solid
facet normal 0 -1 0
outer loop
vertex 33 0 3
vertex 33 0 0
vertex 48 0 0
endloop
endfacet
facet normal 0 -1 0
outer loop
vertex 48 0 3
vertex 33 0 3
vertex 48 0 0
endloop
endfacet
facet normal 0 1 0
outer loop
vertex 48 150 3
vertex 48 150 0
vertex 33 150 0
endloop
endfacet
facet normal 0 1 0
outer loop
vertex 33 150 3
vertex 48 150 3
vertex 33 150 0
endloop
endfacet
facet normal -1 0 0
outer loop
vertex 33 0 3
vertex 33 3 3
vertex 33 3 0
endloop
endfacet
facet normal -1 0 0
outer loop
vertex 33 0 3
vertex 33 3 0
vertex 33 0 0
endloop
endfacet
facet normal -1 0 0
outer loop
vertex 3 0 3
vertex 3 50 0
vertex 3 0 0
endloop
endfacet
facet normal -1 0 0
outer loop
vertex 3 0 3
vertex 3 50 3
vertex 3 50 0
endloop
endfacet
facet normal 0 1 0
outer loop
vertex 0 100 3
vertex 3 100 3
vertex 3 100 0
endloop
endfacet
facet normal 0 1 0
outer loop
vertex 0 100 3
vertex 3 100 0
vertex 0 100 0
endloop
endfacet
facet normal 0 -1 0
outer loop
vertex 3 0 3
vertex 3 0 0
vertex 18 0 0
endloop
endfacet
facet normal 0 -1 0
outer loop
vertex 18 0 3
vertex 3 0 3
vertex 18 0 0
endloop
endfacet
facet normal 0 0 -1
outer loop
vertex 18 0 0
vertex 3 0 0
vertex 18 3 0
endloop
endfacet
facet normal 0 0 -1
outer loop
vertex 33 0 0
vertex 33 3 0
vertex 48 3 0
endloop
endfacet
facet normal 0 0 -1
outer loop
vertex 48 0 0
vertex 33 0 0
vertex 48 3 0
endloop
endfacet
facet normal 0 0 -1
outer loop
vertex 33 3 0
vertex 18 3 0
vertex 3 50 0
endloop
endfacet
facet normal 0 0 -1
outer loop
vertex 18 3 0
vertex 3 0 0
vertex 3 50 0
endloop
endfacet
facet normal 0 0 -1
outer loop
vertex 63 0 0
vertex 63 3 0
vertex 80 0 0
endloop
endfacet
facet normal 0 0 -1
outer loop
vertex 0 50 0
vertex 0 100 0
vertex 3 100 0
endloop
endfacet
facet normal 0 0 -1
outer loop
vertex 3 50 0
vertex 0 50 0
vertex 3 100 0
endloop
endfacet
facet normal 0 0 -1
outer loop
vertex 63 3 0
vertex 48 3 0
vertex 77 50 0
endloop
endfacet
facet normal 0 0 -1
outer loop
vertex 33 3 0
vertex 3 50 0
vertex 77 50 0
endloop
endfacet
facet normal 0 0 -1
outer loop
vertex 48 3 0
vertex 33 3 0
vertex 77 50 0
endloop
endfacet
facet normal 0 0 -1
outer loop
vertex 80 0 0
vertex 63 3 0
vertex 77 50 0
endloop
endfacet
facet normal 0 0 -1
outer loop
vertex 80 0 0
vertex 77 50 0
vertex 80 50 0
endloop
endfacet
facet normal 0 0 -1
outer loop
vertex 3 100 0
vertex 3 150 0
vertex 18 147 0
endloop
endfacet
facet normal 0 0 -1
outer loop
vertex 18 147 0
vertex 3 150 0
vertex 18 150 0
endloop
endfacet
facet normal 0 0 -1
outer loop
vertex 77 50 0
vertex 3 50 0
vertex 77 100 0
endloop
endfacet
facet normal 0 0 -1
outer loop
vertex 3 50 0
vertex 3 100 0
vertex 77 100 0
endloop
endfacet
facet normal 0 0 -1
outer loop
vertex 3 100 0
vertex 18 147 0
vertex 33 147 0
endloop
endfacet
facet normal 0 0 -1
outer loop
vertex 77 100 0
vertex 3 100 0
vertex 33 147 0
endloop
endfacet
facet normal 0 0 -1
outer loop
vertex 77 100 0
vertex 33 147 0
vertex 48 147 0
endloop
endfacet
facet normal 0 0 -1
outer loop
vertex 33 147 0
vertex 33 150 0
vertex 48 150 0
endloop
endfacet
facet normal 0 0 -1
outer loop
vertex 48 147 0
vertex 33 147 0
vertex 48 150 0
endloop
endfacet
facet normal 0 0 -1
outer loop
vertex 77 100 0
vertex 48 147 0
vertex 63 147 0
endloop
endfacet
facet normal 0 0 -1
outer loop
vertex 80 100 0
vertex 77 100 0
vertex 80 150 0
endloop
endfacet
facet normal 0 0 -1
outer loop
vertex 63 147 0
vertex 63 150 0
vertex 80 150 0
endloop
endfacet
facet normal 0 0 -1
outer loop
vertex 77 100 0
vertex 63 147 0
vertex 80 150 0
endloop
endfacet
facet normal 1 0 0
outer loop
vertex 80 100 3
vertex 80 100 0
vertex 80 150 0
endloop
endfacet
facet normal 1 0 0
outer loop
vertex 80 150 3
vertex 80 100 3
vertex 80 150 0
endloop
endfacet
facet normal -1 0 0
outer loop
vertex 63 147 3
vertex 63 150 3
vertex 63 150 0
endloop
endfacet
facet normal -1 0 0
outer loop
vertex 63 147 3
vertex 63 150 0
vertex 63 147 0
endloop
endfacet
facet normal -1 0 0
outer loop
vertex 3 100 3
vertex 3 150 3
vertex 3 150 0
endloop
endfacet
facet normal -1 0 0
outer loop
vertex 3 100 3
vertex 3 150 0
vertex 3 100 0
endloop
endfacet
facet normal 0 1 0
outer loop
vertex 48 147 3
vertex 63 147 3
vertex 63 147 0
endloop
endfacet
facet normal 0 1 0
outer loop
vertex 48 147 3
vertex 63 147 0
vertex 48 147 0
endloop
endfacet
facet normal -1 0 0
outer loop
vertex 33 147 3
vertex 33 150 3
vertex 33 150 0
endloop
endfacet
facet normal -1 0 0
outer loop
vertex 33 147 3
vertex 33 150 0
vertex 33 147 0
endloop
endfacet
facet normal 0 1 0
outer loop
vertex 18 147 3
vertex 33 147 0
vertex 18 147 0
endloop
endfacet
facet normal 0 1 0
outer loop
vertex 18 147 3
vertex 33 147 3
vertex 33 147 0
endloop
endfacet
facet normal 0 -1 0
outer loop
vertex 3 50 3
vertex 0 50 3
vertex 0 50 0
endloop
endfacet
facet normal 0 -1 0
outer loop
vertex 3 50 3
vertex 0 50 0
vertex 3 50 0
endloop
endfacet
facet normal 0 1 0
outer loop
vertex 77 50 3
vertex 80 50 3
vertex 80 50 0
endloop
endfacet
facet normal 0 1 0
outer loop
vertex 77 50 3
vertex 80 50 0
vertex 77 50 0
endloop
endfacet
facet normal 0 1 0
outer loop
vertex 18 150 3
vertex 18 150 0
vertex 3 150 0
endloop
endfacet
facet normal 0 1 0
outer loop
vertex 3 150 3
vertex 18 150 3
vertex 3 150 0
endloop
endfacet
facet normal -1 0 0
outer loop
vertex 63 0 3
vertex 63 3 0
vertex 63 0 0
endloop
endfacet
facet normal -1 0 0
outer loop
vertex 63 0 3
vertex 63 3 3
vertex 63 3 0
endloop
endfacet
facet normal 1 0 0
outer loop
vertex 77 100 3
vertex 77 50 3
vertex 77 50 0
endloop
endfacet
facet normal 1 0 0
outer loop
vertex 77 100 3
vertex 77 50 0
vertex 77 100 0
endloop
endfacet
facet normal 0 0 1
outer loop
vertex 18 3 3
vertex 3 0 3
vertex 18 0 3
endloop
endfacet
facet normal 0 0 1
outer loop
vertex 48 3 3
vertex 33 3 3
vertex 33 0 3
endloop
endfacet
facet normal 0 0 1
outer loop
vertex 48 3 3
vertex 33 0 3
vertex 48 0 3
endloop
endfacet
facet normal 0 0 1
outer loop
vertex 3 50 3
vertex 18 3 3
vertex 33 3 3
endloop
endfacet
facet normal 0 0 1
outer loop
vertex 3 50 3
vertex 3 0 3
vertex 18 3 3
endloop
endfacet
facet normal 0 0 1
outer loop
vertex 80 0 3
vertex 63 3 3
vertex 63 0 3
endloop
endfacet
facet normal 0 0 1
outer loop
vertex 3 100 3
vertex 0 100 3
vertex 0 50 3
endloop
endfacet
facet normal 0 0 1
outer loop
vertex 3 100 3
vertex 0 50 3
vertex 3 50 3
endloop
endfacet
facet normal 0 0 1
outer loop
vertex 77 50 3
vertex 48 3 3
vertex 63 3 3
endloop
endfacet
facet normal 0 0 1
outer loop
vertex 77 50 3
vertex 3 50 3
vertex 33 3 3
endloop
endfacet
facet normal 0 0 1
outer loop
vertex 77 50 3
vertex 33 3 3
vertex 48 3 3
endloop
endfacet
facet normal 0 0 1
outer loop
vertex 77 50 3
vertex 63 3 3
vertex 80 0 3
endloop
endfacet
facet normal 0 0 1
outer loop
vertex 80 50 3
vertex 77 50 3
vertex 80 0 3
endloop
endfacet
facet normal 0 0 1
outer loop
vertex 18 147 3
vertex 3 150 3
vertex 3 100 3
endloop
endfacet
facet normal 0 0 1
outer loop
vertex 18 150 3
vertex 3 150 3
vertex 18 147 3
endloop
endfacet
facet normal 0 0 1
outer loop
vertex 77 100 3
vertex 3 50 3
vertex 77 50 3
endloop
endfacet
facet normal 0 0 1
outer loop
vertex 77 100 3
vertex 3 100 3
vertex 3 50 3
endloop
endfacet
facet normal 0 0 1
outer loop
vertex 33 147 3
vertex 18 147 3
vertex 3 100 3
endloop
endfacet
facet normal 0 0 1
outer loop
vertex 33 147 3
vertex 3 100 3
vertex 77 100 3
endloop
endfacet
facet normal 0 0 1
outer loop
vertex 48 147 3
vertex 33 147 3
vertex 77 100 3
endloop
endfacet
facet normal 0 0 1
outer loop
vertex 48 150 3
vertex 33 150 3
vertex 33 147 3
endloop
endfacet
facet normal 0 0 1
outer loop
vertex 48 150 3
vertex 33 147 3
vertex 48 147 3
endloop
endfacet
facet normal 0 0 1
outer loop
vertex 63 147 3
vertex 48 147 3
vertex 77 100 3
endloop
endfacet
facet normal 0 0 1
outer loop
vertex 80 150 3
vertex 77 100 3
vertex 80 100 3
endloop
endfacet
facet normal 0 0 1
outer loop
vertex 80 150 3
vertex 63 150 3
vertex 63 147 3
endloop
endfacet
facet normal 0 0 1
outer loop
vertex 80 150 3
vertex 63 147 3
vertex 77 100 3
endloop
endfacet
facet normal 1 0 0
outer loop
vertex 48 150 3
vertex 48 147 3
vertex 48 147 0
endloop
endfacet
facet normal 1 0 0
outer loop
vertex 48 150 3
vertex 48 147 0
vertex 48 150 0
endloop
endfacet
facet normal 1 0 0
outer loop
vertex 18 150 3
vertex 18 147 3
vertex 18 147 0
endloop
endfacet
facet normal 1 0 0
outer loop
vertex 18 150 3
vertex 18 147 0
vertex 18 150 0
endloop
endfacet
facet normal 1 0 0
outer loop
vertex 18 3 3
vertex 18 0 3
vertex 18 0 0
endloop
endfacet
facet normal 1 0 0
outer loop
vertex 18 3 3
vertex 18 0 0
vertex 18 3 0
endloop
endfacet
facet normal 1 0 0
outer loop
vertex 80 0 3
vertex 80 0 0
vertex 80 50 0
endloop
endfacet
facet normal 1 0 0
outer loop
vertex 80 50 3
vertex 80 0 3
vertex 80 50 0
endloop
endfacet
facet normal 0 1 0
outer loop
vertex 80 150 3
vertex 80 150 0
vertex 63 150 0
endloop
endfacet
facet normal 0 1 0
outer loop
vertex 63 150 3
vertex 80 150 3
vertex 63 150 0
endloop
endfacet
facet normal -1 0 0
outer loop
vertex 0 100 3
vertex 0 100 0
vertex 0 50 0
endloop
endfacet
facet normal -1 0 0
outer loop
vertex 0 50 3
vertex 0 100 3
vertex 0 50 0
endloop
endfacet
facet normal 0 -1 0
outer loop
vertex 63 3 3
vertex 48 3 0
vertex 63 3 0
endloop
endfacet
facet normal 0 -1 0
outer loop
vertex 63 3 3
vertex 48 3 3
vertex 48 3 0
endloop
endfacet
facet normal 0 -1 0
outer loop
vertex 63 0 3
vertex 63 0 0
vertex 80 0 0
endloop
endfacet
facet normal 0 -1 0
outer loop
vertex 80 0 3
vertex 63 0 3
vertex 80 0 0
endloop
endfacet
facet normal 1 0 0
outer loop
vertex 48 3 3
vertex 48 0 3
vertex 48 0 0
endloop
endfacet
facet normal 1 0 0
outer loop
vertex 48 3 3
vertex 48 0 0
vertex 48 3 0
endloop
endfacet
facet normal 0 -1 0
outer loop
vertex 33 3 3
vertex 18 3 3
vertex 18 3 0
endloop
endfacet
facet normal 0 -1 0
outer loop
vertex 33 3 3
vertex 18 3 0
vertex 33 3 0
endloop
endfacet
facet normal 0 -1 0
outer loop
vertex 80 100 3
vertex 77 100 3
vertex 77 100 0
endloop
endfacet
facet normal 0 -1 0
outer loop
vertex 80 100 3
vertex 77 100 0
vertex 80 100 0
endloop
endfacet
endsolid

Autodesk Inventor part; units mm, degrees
ref_plane "YZ Plane" through (0, 0, 0) normal (1, 0, 0) x (0, 1, 0)
ref_plane "XZ Plane" through (0, 0, 0) normal (0, 1, 0) x (-1, 0, 0)
ref_plane "XY Plane" through (0, 0, 0) normal (0, 0, 1) x (1, 0, 0)
sketch "Boceto1" plane through (0, 0, 0) normal (0, 0, 1) x (1, 0, 0)
  line L0 (0, 0) -> (80, 0)
  line L1 (80, 0) -> (80, 150)
  line L2 (80, 150) -> (0, 150)
  line L3 (0, 150) -> (0, 0)
  dimension "d0" = 80
  dimension "d1" = 150
extrude "Extrusión1" add sketch "Boceto1" along normal blind 3
sketch "Boceto2" plane through (0, 0, 3) normal (0, 0, 1) x (1, 0, 0)
  line L0 (0, 0) -> (80, 0) construction
  line L1 (80, 0) -> (80, 150) construction
  line L2 (80, 150) -> (0, 150) construction
  line L3 (0, 150) -> (0, 0) construction
  line L4 (3, 0) -> (0, 0)
  line L5 (0, 0) -> (0, 50)
  line L6 (0, 50) -> (3, 50)
  line L7 (3, 50) -> (3, 0)
  line L8 (0, 150) -> (3, 150)
  line L9 (3, 150) -> (3, 100)
  line L10 (3, 100) -> (0, 100)
  line L11 (0, 100) -> (0, 150)
  line L12 (77, 100) -> (80, 100)
  line L13 (80, 100) -> (80, 50)
  line L14 (80, 50) -> (77, 50)
  line L15 (77, 50) -> (77, 100)
  line L16 (80, 0) -> (80, 150) construction
  point P0 (80, 75)
  point P1 (80, 75)
  dimension "d4" = 3
  dimension "d5" = 50
  dimension "d6" = 3
  dimension "d7" = 50
  dimension "d8" = 50
  dimension "d9" = 3
extrude "Extrusión2" cut sketch "Boceto2" against normal blind 3
sketch "Boceto3" plane through (0, 0, 3) normal (0, 0, 1) x (1, 0, 0)
  line L0 (3, 50) -> (3, 0) construction
  line L1 (3, 0) -> (80, 0) construction
  line L2 (80, 0) -> (80, 50) construction
  line L3 (80, 50) -> (77, 50) construction
  line L4 (77, 50) -> (77, 100) construction
  line L5 (77, 100) -> (80, 100) construction
  line L6 (80, 100) -> (80, 150) construction
  line L7 (80, 150) -> (3, 150) construction
  line L8 (3, 150) -> (3, 100) construction
  line L9 (3, 100) -> (0, 100) construction
  line L10 (0, 100) -> (0, 50) construction
  line L11 (0, 50) -> (3, 50) construction
  line L12 (18, 3) -> (33, 3)
  line L13 (33, 3) -> (33, 0)
  line L14 (33, 0) -> (18, 0)
  line L15 (18, 0) -> (18, 3)
  line L16 (48, 3) -> (63, 3)
  line L17 (63, 3) -> (63, 0)
  line L18 (63, 0) -> (48, 0)
  line L19 (48, 0) -> (48, 3)
  line L20 (3, 0) -> (80, 0) construction
  line L21 (18, 150) -> (33, 150)
  line L22 (33, 150) -> (33, 147)
  line L23 (33, 147) -> (18, 147)
  line L24 (18, 147) -> (18, 150)
  line L25 (48, 147) -> (63, 147)
  line L26 (63, 147) -> (63, 150)
  line L27 (63, 150) -> (48, 150)
  line L28 (48, 150) -> (48, 147)
  line L29 (80, 150) -> (3, 150) construction
  point P0 (0, 0)
  dimension "d12" = 3
  dimension "d13" = 15
  dimension "d14" = 15
  dimension "d15" = 3
  dimension "d16" = 15
  dimension "d17" = 15
  dimension "d20" = 3
  dimension "d21" = 3
  dimension "d22" = 15
  dimension "d23" = 15
  dimension "d24" = 15
  dimension "d25" = 15
extrude "Extrusión3" cut sketch "Boceto3" against normal blind 10 contours L12 L13 L14 L15 | L16 L17 L18 L19
sketch "Boceto4" plane through (0, 0, 3) normal (0, 0, 1) x (1, 0, 0)
  line L0 (33, 3) -> (33, 0) construction
  line L1 (33, 0) -> (48, 0) construction
  line L2 (48, 0) -> (48, 3) construction
  line L3 (48, 3) -> (63, 3) construction
  line L4 (63, 3) -> (63, 0) construction
  line L5 (63, 0) -> (80, 0) construction
  line L6 (80, 0) -> (80, 50) construction
  line L7 (80, 50) -> (77, 50) construction
  line L8 (77, 50) -> (77, 100) construction
  line L9 (77, 100) -> (80, 100) construction
  line L10 (80, 100) -> (80, 150) construction
  line L11 (80, 150) -> (3, 150) construction
  line L12 (3, 150) -> (3, 100) construction
  line L13 (3, 100) -> (0, 100) construction
  line L14 (0, 100) -> (0, 50) construction
  line L15 (0, 50) -> (3, 50) construction
  line L16 (3, 50) -> (3, 0) construction
  line L17 (3, 0) -> (18, 0) construction
  line L18 (18, 0) -> (18, 3) construction
  line L19 (18, 3) -> (33, 3) construction
  line L20 (18, 150) -> (33, 150)
  line L21 (33, 150) -> (33, 147)
  line L22 (33, 147) -> (18, 147)
  line L23 (18, 147) -> (18, 150)
  line L24 (48, 150) -> (63, 150)
  line L25 (63, 150) -> (63, 147)
  line L26 (63, 147) -> (48, 147)
  line L27 (48, 147) -> (48, 150)
  line L28 (80, 150) -> (3, 150) construction
  point P0 (0, 0)
  dimension "d26" = 15
  dimension "d27" = 15
  dimension "d28" = 15
  dimension "d29" = 15
  dimension "d30" = 3
extrude "Extrusión4" cut sketch "Boceto4" against normal blind 10
equation "\"d6\" = d4"
equation "\"d7\" = d5"
equation "\"d8\" = d7"
equation "\"d9\" = d4"
properties part number "Pared Garita"
